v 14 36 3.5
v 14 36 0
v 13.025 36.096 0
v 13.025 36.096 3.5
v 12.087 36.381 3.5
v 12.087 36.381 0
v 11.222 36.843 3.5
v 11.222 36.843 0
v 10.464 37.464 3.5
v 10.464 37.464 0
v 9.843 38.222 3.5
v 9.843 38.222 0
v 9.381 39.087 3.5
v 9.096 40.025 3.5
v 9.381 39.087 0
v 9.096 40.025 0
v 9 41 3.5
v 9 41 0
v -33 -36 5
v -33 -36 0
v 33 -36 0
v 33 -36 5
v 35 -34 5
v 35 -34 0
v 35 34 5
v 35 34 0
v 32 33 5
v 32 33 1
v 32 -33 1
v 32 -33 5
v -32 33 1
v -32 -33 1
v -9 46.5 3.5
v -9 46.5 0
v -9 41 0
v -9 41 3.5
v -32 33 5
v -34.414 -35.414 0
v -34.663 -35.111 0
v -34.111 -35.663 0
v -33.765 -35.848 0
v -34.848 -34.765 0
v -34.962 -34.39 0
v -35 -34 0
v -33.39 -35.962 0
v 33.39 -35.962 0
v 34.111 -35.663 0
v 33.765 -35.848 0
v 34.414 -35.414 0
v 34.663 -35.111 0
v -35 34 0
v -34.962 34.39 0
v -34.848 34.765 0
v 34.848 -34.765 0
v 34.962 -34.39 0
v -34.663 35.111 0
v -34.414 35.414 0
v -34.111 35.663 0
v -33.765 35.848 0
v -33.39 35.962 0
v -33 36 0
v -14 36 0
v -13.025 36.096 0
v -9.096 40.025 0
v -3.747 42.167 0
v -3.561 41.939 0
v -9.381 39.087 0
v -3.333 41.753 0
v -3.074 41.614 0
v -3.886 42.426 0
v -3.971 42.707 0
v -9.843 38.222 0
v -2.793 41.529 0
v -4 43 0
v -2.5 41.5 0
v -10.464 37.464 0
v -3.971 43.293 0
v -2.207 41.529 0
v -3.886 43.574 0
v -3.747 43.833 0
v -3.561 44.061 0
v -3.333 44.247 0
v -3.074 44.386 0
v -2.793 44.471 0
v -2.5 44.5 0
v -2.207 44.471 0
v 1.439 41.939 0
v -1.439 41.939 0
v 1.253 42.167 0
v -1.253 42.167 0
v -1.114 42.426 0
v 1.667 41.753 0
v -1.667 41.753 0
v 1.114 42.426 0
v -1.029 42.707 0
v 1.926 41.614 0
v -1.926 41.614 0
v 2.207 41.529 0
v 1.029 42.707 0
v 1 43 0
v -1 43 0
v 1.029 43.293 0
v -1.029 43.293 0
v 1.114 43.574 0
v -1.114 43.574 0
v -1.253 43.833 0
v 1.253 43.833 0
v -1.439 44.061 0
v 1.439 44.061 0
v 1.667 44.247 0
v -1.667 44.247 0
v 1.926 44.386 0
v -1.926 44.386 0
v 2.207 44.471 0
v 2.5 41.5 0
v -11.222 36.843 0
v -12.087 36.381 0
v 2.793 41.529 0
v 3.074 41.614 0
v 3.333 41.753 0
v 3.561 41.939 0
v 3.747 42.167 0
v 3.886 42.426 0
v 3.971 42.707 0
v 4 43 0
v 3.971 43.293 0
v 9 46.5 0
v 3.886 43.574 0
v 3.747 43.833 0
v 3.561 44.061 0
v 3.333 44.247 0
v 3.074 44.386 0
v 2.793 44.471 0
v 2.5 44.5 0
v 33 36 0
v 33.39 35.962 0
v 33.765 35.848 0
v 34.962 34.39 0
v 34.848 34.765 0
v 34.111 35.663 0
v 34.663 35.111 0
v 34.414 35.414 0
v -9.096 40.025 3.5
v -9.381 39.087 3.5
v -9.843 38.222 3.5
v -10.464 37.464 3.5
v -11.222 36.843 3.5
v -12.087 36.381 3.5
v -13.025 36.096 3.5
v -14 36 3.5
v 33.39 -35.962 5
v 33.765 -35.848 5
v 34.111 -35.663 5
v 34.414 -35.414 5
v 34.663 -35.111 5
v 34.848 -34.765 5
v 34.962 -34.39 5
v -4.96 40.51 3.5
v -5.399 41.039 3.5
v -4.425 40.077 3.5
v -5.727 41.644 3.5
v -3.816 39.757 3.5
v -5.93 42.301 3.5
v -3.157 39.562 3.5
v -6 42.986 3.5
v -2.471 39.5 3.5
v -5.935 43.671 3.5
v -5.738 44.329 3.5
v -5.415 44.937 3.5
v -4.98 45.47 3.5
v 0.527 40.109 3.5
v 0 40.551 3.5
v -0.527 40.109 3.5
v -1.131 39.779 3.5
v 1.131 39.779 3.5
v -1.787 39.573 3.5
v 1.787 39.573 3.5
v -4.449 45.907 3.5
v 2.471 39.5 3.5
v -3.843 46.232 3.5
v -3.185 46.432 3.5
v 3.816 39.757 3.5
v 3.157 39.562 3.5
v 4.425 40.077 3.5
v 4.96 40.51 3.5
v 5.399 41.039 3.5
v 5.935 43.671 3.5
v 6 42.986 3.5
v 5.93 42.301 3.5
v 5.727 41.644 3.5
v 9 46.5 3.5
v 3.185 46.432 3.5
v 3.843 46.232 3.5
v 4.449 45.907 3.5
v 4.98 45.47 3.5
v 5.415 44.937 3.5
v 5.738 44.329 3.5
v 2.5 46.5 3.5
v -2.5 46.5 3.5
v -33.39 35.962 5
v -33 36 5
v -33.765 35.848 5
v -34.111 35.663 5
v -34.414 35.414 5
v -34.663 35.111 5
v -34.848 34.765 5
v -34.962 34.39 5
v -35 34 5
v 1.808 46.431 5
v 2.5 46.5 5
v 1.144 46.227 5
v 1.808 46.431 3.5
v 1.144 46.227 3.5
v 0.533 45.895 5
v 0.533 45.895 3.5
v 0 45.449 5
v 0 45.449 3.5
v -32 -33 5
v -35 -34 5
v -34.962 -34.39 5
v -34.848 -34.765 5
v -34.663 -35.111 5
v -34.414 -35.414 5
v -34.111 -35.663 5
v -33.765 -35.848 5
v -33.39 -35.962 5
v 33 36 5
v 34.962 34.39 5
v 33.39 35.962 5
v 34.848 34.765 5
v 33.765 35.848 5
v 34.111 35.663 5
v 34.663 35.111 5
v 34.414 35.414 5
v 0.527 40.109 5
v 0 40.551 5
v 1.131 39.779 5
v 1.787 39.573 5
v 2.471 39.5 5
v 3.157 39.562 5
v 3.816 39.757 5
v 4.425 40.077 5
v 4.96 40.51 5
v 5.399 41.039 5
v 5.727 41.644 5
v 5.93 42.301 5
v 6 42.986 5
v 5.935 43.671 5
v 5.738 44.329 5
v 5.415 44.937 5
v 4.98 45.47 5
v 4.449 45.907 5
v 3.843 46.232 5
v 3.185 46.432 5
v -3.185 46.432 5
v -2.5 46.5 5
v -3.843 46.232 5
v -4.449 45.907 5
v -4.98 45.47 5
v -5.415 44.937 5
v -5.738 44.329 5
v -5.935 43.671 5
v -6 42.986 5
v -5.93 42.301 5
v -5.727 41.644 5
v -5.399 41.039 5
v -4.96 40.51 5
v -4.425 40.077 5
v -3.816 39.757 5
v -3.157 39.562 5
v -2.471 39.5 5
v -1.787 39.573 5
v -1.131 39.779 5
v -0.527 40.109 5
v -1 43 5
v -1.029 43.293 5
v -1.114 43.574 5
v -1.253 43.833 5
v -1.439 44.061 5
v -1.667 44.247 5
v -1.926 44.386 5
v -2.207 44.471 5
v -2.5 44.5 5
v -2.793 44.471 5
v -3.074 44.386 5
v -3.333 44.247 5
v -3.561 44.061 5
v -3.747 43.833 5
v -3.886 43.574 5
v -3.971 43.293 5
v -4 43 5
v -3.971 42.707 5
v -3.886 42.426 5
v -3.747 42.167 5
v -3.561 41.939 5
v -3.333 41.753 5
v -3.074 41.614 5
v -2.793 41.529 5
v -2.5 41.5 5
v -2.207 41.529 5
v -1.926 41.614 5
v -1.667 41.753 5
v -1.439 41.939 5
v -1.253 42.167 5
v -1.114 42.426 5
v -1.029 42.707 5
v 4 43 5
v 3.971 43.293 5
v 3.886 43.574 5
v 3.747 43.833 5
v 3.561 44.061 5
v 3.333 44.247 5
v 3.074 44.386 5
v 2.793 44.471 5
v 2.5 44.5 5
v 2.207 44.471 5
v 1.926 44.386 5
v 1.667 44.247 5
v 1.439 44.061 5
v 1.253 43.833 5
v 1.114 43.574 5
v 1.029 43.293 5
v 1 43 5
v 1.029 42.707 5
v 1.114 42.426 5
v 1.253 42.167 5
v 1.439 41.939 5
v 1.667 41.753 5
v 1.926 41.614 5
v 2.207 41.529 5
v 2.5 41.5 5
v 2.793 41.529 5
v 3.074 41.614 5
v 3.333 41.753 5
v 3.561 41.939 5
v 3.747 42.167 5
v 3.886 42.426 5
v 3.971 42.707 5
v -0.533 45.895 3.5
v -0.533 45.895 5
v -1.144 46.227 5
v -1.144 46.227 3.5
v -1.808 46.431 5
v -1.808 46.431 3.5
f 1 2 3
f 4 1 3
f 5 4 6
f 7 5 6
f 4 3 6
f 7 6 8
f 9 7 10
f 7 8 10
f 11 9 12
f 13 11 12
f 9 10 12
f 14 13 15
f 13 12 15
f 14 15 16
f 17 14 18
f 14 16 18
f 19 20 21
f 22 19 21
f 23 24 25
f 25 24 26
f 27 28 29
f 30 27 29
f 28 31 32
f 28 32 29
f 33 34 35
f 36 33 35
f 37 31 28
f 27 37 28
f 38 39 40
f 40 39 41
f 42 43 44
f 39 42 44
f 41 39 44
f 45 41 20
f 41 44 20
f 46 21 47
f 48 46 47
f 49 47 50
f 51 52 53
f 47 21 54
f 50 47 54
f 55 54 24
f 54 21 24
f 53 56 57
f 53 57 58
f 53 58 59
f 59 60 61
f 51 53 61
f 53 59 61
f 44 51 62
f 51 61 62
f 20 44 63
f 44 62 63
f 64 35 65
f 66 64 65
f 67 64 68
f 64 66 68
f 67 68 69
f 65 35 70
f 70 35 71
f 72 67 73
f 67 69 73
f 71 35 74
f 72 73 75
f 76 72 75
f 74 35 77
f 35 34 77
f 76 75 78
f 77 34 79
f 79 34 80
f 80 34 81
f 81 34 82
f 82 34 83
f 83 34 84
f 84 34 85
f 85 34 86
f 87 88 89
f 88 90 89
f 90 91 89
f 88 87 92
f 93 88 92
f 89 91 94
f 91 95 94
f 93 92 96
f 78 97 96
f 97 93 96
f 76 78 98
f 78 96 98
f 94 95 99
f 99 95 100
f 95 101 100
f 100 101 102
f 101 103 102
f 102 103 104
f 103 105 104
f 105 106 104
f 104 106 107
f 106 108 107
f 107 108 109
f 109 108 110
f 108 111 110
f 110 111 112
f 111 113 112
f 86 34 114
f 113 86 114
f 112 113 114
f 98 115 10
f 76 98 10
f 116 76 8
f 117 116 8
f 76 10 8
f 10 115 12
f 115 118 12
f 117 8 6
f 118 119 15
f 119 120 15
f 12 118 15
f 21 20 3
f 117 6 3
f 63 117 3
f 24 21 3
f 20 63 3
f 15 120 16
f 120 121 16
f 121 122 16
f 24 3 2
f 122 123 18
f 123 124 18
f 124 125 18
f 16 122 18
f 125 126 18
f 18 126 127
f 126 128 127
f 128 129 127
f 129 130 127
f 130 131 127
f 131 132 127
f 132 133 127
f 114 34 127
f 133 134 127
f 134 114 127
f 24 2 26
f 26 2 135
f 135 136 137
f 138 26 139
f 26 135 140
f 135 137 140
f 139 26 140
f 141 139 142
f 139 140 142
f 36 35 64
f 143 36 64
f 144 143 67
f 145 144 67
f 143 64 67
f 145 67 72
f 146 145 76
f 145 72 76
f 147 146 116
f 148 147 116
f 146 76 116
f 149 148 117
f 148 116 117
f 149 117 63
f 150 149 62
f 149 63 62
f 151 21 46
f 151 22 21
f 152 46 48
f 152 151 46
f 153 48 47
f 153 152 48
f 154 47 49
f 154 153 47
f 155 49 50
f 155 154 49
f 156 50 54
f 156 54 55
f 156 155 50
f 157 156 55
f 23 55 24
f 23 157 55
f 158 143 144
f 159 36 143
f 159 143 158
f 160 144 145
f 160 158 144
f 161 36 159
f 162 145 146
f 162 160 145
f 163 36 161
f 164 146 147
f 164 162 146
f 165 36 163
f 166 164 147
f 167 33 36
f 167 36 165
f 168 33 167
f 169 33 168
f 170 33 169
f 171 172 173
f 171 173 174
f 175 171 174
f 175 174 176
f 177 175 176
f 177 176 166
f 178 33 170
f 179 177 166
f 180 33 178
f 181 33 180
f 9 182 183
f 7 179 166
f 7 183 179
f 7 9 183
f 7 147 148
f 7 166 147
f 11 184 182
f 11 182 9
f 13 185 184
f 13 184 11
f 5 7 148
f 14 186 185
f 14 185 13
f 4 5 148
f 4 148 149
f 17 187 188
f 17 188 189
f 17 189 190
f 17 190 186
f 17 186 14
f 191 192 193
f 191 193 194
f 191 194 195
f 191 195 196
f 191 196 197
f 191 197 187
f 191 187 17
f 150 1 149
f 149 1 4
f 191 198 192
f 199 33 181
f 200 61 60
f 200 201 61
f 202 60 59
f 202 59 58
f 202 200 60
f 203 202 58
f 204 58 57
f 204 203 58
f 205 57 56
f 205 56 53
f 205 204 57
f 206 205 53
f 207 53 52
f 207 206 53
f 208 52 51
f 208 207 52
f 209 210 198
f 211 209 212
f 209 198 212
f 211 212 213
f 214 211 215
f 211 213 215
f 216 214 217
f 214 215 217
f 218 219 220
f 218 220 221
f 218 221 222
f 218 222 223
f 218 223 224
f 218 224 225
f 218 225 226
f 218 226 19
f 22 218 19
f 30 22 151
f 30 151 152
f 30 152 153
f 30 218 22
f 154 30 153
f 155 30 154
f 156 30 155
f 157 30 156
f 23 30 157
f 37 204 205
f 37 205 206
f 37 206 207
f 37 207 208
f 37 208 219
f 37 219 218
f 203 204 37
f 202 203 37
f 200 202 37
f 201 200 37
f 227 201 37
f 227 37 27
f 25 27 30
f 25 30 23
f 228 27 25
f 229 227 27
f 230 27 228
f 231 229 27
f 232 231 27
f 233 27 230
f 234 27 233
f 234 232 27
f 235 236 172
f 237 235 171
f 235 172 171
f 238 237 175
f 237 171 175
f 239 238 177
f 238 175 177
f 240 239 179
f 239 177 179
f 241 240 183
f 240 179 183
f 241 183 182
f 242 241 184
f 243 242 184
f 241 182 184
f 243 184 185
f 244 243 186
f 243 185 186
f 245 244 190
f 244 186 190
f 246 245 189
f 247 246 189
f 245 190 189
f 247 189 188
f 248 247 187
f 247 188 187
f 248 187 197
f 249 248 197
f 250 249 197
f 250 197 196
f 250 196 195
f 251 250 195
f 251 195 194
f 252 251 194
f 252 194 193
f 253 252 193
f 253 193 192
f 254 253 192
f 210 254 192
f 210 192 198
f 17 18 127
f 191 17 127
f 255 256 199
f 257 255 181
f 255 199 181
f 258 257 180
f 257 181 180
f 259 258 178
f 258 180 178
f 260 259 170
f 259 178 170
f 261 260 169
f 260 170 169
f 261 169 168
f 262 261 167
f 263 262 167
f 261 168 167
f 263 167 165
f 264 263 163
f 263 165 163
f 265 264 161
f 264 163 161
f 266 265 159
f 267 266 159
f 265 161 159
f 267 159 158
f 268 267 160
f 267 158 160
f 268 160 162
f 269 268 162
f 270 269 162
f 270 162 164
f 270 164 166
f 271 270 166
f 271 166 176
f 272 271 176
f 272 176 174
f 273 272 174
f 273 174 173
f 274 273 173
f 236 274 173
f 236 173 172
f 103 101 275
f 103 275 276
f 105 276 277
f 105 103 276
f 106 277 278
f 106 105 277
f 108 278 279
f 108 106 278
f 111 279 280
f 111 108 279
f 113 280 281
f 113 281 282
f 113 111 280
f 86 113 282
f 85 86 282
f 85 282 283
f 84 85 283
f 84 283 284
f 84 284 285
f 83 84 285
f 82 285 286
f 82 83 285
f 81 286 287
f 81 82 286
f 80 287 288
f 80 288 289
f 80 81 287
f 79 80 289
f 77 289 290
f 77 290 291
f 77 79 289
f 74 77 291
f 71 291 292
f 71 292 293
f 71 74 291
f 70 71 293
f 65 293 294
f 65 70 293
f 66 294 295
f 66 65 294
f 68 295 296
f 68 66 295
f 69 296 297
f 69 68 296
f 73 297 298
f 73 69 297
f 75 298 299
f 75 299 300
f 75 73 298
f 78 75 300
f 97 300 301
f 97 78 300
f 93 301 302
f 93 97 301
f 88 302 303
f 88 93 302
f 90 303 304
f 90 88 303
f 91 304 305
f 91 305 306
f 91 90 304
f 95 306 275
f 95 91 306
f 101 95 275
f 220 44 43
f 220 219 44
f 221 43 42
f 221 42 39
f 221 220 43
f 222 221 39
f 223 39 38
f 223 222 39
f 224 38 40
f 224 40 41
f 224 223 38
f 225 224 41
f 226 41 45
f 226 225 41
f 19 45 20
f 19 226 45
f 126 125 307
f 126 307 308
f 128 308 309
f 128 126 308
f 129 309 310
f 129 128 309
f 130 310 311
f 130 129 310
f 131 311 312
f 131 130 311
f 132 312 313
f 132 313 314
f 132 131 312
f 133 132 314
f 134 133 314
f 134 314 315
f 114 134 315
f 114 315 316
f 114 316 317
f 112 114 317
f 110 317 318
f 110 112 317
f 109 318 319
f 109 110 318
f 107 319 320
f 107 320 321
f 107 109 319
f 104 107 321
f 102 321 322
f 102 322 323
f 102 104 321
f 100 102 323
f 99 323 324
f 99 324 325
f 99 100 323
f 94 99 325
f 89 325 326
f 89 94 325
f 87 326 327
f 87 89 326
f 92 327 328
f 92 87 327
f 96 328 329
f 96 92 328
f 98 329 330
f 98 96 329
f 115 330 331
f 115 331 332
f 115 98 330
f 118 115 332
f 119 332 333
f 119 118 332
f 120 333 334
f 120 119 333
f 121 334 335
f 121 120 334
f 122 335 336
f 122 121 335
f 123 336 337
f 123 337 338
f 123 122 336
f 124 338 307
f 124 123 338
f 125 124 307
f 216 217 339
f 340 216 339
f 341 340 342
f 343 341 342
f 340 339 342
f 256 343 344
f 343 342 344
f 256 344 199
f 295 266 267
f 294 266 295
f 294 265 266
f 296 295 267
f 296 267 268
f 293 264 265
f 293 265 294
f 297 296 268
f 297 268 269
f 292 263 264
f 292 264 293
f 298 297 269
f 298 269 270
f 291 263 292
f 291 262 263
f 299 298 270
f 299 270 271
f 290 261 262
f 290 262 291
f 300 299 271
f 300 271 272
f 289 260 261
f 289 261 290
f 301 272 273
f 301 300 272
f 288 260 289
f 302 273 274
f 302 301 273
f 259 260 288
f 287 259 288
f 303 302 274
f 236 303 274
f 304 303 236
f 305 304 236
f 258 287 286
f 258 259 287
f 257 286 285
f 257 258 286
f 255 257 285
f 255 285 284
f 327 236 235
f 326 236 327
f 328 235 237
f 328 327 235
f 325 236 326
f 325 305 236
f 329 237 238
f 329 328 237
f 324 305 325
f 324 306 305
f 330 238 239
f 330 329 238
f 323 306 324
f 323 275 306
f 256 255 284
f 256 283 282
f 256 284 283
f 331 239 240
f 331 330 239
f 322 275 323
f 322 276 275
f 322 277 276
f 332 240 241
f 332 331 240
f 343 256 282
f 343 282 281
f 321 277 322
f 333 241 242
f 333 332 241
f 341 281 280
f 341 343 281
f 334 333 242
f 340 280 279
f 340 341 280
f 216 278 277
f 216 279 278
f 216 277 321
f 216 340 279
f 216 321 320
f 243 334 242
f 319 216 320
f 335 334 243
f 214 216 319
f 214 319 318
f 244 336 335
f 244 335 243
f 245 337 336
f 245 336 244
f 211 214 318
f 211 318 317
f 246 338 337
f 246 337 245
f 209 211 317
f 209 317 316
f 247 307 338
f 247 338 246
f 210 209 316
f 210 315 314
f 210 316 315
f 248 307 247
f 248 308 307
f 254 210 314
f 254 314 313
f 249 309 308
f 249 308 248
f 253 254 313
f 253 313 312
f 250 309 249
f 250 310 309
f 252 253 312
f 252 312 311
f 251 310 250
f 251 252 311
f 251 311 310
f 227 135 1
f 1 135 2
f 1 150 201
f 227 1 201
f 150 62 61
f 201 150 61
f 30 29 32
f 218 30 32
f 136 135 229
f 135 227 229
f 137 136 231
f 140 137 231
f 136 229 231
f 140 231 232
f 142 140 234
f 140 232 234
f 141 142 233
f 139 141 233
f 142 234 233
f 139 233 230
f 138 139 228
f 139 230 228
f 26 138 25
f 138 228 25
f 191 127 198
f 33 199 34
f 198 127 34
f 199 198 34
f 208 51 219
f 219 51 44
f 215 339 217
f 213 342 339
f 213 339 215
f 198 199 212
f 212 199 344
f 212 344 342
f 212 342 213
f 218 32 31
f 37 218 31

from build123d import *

# Parameters (mm, degrees)
F1_DEPTH = 5
F0_R     = 1.5
F2_DEPTH = 3.5
F3_DEPTH = 1
F4_R     = 2


# Not quite as in the source:
# - a feature names something its author has since deleted; it is built from what else it names


with BuildPart() as f1:
    # F0 (on Top) → F1 (new body)
    with BuildSketch(Plane.XY):
        Polygon((35, 36), (14, 36), (-14, 36), (-35, 36), (-35, -36), (35, -36), (35, -33), (35, 33), align=None)
        Polygon((-32, 14.5), (-32, 33), (32, 33), (32, -2), (32, -12.5), (32, -33), (12.7135775983, -33), (-8, -33), (-32, -33), (-32, -14), (-32, 10.5), align=None, mode=Mode.SUBTRACT)
    extrude(amount=F1_DEPTH)



with BuildPart() as f1b:
    # F0 (on Top) → F1, piece 2 (new body)
    with BuildSketch(Plane.XY):
        with BuildLine():
            ThreePointArc((0, 40.5505102572), (5.7267021942, 41.6441264992), (2.5, 46.5))
            ThreePointArc((2.5, 46.5), (1.1441264992, 46.2267021942), (0, 45.4494897428))
            ThreePointArc((0, 45.4494897428), (-1.1441264992, 46.2267021942), (-2.5, 46.5))
            ThreePointArc((-2.5, 46.5), (-5.7267021942, 41.6441264992), (0, 40.5505102572))
        make_face()
        with Locations((-2.5, 43)):
            Circle(F0_R, mode=Mode.SUBTRACT)
        with Locations((2.5, 43)):
            Circle(F0_R, mode=Mode.SUBTRACT)
    extrude(amount=F1_DEPTH)


with BuildPart() as f1_1:
    add(f1.part)

    add(f1b.part)  # F2 merges F1b
    # F0 (on Top) → F2 (join)
    with BuildSketch(Plane.XY):
        with BuildLine():
            Line((-14, 36), (14, 36))
            ThreePointArc((14, 36), (10.4644660941, 37.4644660941), (9, 41))
            Line((9, 41), (9, 46.5))
            Line((9, 46.5), (2.5, 46.5))
            ThreePointArc((2.5, 46.5), (5.7267021942, 41.6441264992), (0, 40.5505102572))
            ThreePointArc((0, 40.5505102572), (-5.7267021942, 41.6441264992), (-2.5, 46.5))
            Line((-2.5, 46.5), (-9, 46.5))
            Line((-9, 46.5), (-9, 41))
            ThreePointArc((-9, 41), (-10.4644660941, 37.4644660941), (-14, 36))
        make_face()
        with BuildLine():
            ThreePointArc((0, 45.4494897428), (1.1441264992, 46.2267021942), (2.5, 46.5))
            Line((2.5, 46.5), (-2.5, 46.5))
            ThreePointArc((-2.5, 46.5), (-1.1441264992, 46.2267021942), (0, 45.4494897428))
        make_face()
    extrude(amount=F2_DEPTH)

    # F0 (on Top) → F3 (join)
    with BuildSketch(Plane.XY):
        Polygon((32, 33), (-32, 33), (-32, 14.5), (-32, 10.5), (-32, -14), (-32, -33), (-8, -33), (12.7135775983, -33), (32, -33), (32, -12.5), (32, -2), align=None)
    extrude(amount=F3_DEPTH)

    # F4
    f4_edges = [f1_1.edges().sort_by_distance(p)[0] for p in [
        (-35, -36, 2.5),
        (35, -36, 2.5),
        (-35, 36, 2.5),
        (35, 36, 2.5),
    ]]
    fillet(f4_edges, radius=F4_R)


solid = f1_1.part
